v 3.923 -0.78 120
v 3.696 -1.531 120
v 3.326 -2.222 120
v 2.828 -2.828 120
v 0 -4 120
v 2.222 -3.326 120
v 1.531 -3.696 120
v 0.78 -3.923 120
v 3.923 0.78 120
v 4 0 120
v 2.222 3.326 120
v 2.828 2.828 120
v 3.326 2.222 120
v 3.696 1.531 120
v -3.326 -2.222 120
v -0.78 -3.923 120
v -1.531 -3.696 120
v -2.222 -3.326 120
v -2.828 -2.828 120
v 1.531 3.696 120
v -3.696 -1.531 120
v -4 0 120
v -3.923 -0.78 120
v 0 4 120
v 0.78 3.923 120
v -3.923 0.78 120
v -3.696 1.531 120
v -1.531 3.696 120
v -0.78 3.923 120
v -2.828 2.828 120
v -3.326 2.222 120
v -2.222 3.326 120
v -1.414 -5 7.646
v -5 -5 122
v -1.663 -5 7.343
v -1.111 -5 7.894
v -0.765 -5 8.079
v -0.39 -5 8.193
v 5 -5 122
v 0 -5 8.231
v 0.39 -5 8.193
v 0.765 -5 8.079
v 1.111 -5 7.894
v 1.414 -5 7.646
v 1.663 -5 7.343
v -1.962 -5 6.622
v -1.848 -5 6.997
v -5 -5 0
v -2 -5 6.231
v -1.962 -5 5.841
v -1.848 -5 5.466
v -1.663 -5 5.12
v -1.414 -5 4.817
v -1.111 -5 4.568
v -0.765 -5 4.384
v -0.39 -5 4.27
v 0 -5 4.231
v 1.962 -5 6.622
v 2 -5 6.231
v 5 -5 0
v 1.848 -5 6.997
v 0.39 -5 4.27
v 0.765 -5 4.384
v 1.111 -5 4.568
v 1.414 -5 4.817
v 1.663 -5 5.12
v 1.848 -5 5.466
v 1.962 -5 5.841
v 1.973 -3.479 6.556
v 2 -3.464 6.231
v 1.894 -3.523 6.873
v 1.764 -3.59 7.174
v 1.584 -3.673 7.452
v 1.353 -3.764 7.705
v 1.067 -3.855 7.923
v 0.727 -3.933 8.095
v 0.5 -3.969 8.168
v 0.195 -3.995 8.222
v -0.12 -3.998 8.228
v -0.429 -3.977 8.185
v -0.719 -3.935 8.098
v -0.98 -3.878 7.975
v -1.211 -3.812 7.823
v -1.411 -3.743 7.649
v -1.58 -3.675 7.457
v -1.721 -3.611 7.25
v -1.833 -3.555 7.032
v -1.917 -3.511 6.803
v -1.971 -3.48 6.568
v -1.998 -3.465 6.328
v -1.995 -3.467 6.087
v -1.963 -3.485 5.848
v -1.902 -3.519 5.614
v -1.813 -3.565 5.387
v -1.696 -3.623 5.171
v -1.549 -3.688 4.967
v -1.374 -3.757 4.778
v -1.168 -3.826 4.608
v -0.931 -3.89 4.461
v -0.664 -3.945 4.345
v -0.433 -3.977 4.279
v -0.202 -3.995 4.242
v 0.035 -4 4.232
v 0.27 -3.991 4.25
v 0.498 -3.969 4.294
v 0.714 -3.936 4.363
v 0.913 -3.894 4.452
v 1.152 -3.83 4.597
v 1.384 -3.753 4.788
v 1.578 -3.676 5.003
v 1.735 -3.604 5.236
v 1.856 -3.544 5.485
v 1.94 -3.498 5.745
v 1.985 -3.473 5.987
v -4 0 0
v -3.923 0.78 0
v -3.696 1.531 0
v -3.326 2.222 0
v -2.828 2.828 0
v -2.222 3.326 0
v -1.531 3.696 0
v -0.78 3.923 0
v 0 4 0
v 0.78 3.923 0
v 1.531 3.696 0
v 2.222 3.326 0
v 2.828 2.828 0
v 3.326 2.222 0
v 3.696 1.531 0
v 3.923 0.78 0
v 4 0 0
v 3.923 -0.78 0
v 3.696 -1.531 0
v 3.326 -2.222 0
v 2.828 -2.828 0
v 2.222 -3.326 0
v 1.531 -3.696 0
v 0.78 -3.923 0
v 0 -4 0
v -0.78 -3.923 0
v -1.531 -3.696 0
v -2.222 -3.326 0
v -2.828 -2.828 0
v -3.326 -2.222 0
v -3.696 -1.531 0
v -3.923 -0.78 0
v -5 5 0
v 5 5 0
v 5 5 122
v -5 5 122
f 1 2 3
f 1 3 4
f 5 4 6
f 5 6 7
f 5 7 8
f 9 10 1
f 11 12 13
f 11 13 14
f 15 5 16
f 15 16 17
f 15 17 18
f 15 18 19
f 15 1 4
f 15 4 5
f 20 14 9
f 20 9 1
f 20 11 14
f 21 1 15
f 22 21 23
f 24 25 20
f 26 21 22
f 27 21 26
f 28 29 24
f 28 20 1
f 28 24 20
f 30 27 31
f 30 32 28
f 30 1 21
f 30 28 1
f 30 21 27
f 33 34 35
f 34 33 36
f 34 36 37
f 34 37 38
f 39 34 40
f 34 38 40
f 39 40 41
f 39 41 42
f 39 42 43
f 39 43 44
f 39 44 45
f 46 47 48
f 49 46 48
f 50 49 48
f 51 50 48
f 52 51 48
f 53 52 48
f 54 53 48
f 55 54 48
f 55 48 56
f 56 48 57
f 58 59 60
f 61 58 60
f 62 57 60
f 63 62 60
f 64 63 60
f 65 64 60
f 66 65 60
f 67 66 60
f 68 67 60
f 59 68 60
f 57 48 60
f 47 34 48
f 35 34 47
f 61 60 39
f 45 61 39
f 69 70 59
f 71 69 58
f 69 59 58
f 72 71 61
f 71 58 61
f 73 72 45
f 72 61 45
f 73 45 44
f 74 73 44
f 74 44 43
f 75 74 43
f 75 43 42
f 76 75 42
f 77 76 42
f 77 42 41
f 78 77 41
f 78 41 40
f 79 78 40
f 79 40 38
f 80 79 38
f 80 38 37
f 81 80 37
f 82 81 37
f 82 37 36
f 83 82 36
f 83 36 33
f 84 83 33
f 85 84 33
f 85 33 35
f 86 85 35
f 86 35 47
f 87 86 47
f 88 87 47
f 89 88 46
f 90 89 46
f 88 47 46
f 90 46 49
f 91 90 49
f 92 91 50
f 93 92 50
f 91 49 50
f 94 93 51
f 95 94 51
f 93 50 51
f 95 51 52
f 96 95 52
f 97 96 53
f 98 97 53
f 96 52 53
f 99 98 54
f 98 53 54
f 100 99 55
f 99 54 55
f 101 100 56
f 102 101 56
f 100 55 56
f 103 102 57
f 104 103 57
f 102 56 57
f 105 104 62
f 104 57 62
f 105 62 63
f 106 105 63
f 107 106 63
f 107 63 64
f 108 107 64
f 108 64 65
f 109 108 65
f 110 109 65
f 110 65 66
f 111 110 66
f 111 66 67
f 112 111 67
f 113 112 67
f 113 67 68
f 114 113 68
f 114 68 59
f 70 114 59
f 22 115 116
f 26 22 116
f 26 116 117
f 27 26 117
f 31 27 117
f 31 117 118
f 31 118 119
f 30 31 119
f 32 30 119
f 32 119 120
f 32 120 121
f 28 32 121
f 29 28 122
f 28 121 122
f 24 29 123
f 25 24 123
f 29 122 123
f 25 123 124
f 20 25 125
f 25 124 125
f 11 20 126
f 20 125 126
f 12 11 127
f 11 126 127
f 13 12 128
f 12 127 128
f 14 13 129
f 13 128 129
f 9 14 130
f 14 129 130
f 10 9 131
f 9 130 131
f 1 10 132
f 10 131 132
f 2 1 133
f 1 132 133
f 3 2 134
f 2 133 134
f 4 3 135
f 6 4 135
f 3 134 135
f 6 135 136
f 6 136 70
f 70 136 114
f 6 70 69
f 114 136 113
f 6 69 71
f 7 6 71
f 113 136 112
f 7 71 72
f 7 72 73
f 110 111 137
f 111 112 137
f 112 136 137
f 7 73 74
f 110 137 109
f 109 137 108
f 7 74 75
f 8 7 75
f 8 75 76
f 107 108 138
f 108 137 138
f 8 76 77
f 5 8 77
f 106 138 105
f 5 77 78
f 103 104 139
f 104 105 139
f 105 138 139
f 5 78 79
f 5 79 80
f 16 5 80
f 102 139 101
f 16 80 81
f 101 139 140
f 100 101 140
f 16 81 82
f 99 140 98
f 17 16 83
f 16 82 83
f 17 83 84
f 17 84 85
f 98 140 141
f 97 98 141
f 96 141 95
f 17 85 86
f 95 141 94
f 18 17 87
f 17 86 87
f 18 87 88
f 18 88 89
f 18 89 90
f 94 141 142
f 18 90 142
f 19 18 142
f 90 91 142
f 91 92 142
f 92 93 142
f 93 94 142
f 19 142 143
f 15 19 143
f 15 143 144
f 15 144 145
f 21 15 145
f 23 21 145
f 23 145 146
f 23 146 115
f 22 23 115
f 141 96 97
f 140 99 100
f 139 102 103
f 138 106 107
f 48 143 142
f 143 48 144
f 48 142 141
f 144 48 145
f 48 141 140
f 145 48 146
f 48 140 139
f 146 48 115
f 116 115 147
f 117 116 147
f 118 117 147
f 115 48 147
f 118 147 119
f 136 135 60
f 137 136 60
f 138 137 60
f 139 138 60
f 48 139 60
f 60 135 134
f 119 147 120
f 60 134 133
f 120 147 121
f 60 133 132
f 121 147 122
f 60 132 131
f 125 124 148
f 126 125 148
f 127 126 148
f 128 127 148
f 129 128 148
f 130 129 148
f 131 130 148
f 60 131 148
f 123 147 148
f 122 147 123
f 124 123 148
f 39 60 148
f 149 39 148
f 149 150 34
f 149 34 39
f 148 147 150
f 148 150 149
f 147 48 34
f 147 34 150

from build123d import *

# Parameters (mm, degrees)
SKETCH_1_W          = 10
SKETCH_1_H          = 10
EXTRUDE_1_DEPTH     = 122
SKETCH_2_R          = 4
CUT_EXTRUDE_1_DEPTH = 120
SKETCH_3_R          = 2
CUT_EXTRUDE_2_DEPTH = 2


with BuildPart() as part:
    # 草图1 → 凸台-拉伸1 (new body)
    with BuildSketch(Plane.XY):
        Rectangle(SKETCH_1_W, SKETCH_1_H)
    extrude(amount=EXTRUDE_1_DEPTH)

    # 草图2 → 切除-拉伸1 (cut)
    with BuildSketch(Plane(origin=(0, 0, 0), x_dir=(-1, 0, 0), z_dir=(0, 0, -1))):
        Circle(SKETCH_2_R)
    extrude(amount=-CUT_EXTRUDE_1_DEPTH, mode=Mode.SUBTRACT)

    # 草图3 → 切除-拉伸2 (cut)
    with BuildSketch(Plane.XZ.offset(5)):
        with Locations((0, 6.231427265)):
            Circle(SKETCH_3_R)
    extrude(amount=-CUT_EXTRUDE_2_DEPTH, mode=Mode.SUBTRACT)


solid = part.part
